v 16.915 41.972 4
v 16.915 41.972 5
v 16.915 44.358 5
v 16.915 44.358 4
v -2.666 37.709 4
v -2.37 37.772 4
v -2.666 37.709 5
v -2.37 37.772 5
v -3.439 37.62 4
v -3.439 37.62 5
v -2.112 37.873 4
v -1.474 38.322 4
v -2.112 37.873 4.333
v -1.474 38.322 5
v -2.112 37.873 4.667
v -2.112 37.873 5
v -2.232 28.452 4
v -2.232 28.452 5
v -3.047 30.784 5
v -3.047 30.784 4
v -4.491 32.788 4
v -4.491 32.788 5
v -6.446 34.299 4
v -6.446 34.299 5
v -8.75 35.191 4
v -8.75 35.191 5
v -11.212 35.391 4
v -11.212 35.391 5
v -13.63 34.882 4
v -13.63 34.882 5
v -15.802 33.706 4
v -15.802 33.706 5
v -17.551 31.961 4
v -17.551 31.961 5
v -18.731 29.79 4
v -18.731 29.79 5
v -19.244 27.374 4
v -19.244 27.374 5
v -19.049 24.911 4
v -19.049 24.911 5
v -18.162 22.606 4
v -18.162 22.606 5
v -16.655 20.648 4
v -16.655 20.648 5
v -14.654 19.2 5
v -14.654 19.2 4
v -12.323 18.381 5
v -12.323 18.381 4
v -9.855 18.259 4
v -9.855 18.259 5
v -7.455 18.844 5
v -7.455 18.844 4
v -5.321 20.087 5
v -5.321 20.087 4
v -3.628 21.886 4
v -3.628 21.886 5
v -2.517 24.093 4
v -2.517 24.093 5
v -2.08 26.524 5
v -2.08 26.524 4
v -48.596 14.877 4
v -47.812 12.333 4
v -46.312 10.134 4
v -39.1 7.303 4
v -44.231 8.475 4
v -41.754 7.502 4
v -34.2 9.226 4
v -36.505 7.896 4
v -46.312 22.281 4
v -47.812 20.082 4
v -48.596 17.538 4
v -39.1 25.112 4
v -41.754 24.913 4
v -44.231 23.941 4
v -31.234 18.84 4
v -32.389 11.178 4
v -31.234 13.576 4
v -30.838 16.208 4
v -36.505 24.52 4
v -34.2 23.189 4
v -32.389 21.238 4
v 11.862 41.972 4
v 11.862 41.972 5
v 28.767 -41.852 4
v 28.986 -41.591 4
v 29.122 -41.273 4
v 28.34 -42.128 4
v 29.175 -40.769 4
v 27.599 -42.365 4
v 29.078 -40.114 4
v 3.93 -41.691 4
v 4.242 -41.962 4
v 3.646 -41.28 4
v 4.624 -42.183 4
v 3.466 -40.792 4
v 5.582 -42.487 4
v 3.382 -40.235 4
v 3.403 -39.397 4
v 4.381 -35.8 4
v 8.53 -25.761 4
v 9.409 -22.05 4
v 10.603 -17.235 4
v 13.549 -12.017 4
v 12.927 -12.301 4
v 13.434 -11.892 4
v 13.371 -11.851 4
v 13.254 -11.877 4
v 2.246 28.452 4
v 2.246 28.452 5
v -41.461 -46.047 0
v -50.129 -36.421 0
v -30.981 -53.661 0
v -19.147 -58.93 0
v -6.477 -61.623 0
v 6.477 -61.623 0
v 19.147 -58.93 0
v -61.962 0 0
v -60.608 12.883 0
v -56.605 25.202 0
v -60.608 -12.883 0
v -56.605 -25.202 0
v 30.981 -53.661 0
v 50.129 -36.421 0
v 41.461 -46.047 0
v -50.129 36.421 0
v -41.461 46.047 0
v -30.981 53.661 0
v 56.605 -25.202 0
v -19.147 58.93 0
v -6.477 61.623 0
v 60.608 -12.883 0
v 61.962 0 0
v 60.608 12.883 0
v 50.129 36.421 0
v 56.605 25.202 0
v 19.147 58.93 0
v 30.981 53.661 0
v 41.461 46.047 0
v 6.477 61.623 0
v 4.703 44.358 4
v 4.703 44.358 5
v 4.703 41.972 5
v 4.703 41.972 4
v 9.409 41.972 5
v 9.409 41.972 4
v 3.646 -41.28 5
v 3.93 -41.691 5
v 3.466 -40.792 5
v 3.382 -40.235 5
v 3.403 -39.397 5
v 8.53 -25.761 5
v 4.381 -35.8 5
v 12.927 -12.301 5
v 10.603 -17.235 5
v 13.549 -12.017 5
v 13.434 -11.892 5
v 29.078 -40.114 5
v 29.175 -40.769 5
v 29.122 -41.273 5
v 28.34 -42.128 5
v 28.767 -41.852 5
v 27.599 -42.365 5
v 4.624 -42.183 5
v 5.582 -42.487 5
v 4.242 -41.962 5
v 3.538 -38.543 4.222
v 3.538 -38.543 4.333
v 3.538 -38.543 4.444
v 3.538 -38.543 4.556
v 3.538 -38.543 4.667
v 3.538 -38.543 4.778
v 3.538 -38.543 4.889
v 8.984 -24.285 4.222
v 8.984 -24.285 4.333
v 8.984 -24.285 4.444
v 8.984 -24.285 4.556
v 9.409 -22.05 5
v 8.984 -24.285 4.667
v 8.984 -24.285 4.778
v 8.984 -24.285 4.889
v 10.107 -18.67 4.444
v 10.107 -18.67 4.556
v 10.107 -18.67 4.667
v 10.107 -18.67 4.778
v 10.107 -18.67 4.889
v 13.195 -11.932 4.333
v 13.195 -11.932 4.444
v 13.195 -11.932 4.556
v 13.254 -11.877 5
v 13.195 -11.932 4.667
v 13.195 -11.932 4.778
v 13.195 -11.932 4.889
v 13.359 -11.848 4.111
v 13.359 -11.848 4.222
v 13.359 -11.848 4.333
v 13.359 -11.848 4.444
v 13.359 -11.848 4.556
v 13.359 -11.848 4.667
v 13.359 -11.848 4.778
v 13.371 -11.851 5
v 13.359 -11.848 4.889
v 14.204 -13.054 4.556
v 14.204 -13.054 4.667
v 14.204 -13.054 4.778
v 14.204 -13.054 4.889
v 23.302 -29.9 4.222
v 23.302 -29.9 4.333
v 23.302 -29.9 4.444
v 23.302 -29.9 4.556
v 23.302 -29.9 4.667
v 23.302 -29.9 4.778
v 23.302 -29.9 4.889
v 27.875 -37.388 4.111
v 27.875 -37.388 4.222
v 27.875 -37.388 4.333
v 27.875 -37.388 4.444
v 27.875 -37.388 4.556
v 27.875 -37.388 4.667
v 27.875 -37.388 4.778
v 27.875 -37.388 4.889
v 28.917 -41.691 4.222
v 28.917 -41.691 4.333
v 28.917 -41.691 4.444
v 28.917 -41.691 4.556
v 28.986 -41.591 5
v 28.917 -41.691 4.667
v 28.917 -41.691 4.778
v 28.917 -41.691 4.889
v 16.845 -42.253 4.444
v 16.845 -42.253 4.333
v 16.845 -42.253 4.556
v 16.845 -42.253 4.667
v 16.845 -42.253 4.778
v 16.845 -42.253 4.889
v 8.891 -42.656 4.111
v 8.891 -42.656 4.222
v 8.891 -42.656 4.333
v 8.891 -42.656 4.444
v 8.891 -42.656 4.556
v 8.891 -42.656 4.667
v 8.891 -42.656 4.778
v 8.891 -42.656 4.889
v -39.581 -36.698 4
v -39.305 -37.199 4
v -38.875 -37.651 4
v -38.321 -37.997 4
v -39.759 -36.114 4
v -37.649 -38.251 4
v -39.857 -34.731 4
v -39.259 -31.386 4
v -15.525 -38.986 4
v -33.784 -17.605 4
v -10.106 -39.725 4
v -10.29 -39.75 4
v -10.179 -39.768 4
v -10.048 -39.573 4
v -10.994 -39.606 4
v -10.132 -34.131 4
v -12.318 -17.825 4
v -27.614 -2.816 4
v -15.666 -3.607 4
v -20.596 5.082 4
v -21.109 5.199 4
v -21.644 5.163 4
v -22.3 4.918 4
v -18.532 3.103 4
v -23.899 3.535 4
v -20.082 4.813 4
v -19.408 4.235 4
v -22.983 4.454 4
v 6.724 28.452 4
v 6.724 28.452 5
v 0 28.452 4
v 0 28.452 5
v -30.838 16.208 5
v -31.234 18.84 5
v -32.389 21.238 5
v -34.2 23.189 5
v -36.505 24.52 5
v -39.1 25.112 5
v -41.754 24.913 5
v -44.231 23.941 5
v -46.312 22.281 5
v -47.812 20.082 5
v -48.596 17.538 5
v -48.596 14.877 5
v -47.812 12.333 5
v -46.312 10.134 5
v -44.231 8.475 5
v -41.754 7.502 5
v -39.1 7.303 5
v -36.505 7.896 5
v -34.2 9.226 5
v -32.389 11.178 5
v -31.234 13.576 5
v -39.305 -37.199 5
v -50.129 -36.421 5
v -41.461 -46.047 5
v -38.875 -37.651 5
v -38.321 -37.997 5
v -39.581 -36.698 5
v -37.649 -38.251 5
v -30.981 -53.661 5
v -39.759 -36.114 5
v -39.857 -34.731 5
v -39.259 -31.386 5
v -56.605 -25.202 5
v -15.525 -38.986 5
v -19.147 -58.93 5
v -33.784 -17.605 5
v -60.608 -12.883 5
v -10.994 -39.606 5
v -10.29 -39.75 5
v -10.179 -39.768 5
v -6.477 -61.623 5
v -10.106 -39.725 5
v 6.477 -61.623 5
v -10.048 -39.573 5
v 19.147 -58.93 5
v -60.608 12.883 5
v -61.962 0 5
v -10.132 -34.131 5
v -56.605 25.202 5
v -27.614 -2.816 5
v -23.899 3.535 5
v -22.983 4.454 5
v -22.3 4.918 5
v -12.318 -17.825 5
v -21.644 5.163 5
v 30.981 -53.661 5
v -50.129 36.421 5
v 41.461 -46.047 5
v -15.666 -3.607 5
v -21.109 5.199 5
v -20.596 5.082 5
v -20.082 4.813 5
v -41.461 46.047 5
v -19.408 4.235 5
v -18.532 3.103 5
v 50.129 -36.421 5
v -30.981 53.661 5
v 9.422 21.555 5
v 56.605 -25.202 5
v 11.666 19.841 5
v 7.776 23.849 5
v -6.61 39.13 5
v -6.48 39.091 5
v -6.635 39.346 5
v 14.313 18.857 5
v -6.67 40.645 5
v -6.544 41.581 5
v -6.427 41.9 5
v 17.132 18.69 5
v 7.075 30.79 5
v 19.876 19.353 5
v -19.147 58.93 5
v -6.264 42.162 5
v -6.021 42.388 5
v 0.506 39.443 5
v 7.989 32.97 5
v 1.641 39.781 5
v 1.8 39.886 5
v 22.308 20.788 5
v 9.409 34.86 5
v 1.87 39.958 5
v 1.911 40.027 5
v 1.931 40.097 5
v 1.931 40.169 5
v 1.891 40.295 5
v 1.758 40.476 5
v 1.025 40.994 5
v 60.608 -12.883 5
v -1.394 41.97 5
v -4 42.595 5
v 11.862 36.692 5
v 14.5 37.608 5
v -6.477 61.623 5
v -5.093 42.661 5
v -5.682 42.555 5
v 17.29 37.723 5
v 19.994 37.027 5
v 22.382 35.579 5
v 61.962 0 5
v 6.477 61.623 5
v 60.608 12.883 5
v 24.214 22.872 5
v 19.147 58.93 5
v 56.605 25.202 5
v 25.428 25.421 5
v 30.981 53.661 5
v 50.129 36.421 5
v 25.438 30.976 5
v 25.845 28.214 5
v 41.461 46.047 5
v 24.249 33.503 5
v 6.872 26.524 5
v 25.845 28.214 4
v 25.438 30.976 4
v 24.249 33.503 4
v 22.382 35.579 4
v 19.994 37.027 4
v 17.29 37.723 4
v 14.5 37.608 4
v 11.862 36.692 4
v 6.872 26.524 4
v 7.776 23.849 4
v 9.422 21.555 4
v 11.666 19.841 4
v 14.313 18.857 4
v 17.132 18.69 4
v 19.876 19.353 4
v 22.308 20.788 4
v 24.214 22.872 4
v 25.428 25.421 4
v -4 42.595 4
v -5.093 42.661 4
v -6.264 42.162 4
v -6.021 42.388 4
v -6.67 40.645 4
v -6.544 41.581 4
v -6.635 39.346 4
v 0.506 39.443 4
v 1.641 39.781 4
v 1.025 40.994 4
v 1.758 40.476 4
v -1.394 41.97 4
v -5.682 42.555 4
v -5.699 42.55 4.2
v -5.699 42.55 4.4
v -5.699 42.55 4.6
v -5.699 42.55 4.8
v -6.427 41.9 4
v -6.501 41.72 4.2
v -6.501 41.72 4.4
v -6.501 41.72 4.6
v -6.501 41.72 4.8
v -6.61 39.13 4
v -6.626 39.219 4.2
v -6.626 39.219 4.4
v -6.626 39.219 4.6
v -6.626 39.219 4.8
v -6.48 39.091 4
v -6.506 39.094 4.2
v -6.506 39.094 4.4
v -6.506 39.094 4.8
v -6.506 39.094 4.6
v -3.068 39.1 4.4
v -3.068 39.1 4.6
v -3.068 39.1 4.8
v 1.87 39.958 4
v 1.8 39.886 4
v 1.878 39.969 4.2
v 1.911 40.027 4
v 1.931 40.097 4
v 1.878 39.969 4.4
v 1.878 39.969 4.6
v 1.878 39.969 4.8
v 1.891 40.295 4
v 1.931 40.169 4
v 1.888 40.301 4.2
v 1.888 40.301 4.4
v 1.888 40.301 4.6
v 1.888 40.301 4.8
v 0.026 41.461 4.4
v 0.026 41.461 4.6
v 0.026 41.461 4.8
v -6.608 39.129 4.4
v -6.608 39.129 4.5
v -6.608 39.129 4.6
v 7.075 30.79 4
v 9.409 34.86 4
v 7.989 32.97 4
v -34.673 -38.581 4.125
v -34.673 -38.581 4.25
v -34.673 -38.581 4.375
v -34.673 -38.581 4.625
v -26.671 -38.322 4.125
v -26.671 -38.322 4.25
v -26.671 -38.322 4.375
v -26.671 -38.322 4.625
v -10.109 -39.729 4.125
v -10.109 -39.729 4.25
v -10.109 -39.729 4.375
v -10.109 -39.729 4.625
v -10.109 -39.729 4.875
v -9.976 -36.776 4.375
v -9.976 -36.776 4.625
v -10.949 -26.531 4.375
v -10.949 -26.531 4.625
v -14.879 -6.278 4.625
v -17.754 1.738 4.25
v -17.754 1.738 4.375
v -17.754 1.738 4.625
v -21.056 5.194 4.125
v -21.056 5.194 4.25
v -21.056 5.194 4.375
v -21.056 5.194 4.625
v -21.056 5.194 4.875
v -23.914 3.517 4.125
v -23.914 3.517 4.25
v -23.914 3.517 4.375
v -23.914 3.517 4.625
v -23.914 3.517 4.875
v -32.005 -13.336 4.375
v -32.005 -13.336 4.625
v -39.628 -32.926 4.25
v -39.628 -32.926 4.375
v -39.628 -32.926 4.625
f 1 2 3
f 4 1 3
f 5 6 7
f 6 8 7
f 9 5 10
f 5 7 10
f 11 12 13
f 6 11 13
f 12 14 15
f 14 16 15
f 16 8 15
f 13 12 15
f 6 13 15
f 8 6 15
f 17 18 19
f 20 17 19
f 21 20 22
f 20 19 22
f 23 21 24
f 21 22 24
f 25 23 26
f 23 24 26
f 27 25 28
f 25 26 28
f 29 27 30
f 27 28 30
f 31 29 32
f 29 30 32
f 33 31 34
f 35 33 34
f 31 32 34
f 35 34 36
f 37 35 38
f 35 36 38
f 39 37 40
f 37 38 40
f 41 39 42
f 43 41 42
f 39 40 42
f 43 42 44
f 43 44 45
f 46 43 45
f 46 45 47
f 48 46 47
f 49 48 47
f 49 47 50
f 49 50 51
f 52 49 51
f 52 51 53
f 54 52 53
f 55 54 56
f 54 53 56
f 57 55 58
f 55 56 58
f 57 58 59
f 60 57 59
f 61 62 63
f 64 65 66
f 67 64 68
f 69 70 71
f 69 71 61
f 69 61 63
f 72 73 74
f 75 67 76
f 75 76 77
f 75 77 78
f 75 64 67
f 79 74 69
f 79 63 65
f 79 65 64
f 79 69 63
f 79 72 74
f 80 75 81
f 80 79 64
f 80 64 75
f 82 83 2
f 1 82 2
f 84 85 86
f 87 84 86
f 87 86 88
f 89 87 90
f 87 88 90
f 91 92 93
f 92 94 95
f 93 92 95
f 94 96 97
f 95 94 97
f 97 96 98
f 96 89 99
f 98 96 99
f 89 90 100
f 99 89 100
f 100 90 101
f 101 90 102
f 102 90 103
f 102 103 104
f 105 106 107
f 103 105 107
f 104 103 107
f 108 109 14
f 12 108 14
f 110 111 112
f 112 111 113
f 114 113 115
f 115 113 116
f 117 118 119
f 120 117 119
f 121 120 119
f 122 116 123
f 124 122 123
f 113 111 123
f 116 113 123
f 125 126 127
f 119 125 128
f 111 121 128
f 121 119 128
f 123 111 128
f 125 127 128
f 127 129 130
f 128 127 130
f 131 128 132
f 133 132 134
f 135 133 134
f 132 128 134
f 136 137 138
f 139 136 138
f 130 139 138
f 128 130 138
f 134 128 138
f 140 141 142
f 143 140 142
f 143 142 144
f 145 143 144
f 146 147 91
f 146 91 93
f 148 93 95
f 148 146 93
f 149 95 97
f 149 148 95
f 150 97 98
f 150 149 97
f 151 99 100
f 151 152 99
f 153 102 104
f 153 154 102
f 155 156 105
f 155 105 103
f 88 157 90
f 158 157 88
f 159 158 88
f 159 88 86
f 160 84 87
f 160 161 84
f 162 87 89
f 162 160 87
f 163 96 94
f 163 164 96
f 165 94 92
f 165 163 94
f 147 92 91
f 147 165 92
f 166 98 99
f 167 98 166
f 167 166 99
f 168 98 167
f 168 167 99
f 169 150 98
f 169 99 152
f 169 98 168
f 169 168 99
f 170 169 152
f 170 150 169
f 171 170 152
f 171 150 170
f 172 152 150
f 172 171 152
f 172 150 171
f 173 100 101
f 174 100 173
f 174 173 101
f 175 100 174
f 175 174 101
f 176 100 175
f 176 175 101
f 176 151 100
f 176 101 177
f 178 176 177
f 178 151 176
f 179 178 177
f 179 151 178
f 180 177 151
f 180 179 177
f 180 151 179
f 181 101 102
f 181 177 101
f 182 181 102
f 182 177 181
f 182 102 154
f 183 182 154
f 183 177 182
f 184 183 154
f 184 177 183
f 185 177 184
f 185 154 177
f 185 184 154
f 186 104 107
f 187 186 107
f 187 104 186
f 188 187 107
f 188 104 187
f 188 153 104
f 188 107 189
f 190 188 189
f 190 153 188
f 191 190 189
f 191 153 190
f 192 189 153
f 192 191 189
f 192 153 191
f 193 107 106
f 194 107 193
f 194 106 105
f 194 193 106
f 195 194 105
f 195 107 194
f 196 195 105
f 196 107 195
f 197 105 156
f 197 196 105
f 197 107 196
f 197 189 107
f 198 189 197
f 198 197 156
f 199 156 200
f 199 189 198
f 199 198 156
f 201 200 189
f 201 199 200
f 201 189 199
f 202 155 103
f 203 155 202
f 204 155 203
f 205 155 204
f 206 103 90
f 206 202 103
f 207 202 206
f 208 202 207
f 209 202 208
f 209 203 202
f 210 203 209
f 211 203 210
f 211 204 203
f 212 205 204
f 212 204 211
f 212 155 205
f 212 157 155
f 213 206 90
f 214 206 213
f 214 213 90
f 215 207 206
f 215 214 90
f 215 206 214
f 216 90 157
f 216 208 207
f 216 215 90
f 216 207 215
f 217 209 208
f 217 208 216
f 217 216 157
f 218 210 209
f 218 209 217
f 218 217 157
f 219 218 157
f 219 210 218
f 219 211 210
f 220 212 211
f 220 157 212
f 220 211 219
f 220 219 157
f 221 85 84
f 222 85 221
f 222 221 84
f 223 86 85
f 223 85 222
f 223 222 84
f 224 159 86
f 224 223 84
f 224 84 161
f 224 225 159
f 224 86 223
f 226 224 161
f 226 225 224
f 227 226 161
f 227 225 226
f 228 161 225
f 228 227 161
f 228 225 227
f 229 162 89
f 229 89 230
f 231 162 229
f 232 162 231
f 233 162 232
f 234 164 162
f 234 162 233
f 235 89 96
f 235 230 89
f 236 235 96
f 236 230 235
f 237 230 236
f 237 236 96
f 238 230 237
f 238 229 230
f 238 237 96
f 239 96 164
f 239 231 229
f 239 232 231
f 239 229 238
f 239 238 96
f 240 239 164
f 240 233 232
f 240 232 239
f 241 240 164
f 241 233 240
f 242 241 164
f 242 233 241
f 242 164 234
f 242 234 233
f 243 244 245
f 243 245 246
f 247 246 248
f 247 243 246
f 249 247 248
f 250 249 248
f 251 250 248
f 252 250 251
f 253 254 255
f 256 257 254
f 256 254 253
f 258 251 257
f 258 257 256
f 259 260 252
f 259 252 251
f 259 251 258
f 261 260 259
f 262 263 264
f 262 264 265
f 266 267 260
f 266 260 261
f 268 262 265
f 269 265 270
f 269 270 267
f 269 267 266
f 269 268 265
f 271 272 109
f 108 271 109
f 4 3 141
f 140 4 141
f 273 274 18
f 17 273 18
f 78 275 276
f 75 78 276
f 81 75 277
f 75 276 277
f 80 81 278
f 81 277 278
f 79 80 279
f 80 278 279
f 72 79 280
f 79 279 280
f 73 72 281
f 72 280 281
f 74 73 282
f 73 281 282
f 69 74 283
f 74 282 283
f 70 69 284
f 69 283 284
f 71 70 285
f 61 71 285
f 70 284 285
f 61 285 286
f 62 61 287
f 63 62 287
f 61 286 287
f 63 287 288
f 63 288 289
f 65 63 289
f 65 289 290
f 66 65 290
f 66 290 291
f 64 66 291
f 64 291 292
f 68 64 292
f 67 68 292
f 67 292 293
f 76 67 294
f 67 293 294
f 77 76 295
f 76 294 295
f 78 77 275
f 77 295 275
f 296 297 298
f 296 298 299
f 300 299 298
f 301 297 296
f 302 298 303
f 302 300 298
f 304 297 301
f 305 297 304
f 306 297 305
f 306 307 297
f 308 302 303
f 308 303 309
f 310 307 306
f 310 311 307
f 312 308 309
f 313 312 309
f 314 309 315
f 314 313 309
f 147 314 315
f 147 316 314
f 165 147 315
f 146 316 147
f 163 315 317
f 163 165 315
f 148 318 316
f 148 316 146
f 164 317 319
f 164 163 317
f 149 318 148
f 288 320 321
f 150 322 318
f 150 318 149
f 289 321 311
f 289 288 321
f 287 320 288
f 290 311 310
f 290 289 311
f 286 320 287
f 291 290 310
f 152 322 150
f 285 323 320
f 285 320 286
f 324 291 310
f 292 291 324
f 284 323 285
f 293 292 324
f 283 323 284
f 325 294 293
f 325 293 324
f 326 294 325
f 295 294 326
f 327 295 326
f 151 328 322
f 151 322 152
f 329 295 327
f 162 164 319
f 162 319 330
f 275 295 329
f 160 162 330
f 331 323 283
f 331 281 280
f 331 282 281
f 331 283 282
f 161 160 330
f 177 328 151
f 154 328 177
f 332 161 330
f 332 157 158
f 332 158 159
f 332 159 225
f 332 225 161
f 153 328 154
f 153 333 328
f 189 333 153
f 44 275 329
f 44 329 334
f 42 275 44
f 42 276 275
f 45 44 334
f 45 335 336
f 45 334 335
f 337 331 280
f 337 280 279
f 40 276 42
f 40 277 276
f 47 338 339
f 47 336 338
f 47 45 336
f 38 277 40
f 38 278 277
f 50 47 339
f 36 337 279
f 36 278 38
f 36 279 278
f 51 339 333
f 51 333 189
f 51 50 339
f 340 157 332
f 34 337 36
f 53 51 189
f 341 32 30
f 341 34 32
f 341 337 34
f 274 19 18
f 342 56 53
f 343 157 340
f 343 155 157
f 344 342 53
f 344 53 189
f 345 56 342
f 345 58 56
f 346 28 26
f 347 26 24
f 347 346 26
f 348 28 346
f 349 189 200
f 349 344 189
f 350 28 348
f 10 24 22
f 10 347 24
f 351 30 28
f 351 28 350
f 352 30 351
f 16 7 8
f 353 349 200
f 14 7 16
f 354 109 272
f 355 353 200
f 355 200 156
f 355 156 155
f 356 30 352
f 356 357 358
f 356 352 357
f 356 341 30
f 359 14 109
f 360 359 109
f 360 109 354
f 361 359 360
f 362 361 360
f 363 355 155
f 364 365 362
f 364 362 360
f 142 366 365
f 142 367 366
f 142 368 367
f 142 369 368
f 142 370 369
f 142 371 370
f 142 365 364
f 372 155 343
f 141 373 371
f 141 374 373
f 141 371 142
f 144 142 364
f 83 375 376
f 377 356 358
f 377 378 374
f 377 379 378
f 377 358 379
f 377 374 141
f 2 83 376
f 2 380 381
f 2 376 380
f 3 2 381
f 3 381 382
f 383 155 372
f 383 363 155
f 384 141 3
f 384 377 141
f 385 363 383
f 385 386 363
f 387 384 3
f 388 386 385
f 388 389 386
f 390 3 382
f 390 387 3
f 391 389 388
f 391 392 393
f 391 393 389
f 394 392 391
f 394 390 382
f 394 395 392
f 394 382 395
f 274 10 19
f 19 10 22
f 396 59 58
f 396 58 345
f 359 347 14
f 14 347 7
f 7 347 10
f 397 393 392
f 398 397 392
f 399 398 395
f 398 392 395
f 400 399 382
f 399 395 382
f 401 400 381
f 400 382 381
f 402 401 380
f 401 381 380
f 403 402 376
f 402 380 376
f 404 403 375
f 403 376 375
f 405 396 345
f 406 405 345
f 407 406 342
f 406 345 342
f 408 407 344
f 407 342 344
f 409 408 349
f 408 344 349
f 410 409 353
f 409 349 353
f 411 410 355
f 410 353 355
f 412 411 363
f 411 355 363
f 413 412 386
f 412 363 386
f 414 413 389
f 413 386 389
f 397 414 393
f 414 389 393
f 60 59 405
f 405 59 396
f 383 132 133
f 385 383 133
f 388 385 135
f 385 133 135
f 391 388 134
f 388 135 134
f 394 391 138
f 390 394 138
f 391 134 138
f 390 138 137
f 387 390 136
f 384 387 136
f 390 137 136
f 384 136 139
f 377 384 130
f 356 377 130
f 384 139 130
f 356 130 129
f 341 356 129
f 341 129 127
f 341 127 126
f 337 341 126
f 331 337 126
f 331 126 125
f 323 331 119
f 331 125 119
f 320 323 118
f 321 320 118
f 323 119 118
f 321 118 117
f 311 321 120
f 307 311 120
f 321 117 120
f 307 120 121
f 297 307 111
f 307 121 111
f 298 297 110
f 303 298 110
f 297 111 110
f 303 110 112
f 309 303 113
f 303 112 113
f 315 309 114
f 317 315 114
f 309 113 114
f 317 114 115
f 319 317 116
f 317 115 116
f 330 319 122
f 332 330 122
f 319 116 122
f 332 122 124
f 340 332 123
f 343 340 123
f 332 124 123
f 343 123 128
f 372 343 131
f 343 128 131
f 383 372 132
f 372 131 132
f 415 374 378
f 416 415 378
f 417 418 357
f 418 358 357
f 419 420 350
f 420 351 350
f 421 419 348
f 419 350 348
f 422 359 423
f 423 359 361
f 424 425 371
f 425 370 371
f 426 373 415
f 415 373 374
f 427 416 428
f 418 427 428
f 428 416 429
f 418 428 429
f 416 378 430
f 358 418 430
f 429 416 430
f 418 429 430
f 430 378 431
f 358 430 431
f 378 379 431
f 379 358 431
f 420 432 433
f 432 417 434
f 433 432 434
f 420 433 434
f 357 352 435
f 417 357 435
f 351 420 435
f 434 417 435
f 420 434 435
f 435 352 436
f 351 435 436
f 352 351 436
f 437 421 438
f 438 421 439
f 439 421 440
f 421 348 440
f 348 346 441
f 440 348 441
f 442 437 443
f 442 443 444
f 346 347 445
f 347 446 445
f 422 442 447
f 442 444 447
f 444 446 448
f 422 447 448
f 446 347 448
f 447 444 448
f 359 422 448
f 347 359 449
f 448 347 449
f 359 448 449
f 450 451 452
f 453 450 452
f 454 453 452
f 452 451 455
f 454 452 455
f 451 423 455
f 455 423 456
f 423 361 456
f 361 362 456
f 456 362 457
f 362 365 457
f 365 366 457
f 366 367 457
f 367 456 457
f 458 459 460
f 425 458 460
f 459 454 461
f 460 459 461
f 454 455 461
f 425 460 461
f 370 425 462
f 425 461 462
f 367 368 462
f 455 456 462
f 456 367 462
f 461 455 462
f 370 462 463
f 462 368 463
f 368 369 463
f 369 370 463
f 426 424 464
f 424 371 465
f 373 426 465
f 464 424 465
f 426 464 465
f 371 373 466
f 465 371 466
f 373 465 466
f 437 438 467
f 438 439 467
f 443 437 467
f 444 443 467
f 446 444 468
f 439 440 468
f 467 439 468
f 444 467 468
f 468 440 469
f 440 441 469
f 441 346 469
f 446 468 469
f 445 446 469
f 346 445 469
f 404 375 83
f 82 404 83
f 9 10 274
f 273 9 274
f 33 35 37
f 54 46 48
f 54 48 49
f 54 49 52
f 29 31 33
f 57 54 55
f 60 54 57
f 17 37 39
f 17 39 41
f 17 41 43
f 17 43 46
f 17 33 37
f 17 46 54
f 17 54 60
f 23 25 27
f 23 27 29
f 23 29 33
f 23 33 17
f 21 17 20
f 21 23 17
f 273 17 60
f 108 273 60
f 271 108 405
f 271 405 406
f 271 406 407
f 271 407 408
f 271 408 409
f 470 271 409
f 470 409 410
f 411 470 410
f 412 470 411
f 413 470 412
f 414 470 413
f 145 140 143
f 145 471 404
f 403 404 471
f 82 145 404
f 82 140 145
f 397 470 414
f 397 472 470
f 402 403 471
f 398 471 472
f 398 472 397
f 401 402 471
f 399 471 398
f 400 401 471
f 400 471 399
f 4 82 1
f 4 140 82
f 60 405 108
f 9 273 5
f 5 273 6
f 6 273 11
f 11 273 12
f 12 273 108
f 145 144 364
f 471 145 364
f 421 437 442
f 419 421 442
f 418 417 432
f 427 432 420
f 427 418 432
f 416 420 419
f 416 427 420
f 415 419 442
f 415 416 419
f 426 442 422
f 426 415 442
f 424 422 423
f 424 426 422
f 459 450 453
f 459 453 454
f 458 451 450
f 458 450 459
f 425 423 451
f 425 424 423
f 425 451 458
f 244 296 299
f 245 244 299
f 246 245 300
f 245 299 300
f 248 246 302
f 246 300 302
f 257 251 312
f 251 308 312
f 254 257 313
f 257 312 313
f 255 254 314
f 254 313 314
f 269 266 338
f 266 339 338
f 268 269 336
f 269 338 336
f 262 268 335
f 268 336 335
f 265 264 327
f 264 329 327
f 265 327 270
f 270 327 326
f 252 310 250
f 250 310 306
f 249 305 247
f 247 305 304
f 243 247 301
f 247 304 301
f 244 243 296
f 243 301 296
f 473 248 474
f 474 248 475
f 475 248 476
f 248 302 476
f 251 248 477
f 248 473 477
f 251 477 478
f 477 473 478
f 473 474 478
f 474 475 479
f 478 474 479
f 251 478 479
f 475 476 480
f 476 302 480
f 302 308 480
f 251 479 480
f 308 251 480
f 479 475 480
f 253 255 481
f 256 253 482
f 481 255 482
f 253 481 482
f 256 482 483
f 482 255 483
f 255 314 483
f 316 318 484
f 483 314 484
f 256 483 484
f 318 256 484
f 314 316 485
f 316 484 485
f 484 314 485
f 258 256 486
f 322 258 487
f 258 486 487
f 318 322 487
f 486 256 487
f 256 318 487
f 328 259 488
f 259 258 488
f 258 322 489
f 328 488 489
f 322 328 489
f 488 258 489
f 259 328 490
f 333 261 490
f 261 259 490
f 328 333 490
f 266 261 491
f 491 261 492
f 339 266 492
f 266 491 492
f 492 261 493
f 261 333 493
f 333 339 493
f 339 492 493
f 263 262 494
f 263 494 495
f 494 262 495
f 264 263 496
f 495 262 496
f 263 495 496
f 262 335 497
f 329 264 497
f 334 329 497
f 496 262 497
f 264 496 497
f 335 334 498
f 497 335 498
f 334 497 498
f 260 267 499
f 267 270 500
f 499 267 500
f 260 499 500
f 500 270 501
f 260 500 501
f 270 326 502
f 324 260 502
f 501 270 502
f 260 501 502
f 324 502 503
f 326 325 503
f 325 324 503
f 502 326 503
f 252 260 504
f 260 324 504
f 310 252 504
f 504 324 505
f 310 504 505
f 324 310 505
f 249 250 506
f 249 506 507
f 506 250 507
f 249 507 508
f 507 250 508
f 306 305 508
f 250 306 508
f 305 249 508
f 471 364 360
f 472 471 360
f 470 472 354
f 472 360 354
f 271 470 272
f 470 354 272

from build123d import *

# Parameters (mm, degrees)
F0_R     = 61.9623487285
F1_DEPTH = 5
F3_DEPTH = 1
F5_DEPTH = 1
F7_DEPTH = 1
F8_R     = 8.9292690279
F9_DEPTH = 1


with BuildPart() as f1:
    # F0 (on Top) → F1 (new body)
    with BuildSketch(Plane.XY):
        Circle(F0_R)
    extrude(amount=F1_DEPTH)

    # F2 (on face) → F3 (cut)
    with BuildSketch(Plane.XY.offset(5)):
        with BuildLine():
            add(Edge.make_bspline(
                [(-39.3048152328, -37.1991991997), (-37.7651793317, -39.3408560727), (-26.9602400655, -37.2654556836), (-10.6570598611, -39.5580218969), (-9.7558151733, -39.9834038407), (-10.152733857, -26.2704585367), (-19.5242322502, 19.941913429), (-32.5509442958, -15.6080702025), (-37.5478248801, -25.608945775), (-40.6668393278, -35.3046030406), (-39.3048152328, -37.1991991997)],
                knots=[0, 0, 0, 0, 0.1218310574, 0.2601288227, 0.2782546382, 0.4026452671, 0.600038467, 0.758741847, 0.8922233266, 1, 1, 1, 1], degree=3))
        make_face()
        with BuildLine():
            add(Edge.make_bspline(
                [(3.9304825477, -41.6911803186), (2.6669968583, -40.319533603), (5.0751476068, -33.5221923515), (9.5794311322, -24.2966191015), (9.3447152511, -19.2791505142), (12.9838675707, -11.8248757534), (13.8949803592, -11.8008514316), (22.5604208824, -30.2915392719), (33.3890041695, -44.2826186469), (16.6647932689, -41.1593642165), (5.5715073066, -43.4726854353), (3.9304825477, -41.6911803186)],
                knots=[0, 0, 0, 0, 0.1029925867, 0.2240288031, 0.3130595643, 0.4143515368, 0.4340651574, 0.6024353208, 0.7368916239, 0.8662324503, 1, 1, 1, 1], degree=3))
        make_face()
    extrude(amount=-F3_DEPTH, mode=Mode.SUBTRACT)

    # F4 (on face) → F5 (cut)
    with BuildSketch(Plane.XY.offset(5)):
        with BuildLine():
            ThreePointArc((-2.0797521838, 26.5244096723), (-2.0760909326, 26.6692016953), (-2.0748703999, 26.8140348579))
            ThreePointArc((-2.0748703999, 26.8140348579), (-2.1143389598, 27.636722854), (-2.2323821086, 28.451854206))
            ThreePointArc((-2.2323821086, 28.451854206), (-19.2357400979, 26.1356316973), (-2.0797521838, 26.5244096723))
        make_face()
        with BuildLine():
            Line((-3.4391672816, 37.6203209162), (0, 28.451854206))
            Line((0, 28.451854206), (2.246047079, 28.451854206))
            Line((2.246047079, 28.451854206), (-1.4739270555, 38.3221954107))
            add(Edge.make_bspline(
                [(-1.4739270555, 38.3221954107), (-2.2559350586, 37.6613035057), (-2.4543322401, 37.7411414291), (-3.4391672816, 37.6203209162)],
                knots=[0.8438158989, 0.8438158989, 0.8438158989, 0.8438158989, 1, 1, 1, 1], degree=3))
        make_face()
        with BuildLine():
            ThreePointArc((-2.2323821086, 28.451854206), (-2.1143389598, 27.636722854), (-2.0748703999, 26.8140348579))
            ThreePointArc((-2.0748703999, 26.8140348579), (-2.0760909326, 26.6692016953), (-2.0797521838, 26.5244096723))
            Line((-2.0797521838, 26.5244096723), (6.8719364839, 26.5244096723))
            ThreePointArc((6.8719364839, 26.5244096723), (6.7493739769, 27.4843959893), (6.7244762665, 28.451854206))
            Line((6.7244762665, 28.451854206), (2.246047079, 28.451854206))
            Line((2.246047079, 28.451854206), (0, 28.451854206))
            Line((0, 28.451854206), (-2.2323821086, 28.451854206))
        make_face()
        with BuildLine():
            ThreePointArc((6.7244762665, 28.451854206), (6.7493739769, 27.4843959893), (6.8719364839, 26.5244096723))
            ThreePointArc((6.8719364839, 26.5244096723), (17.1315070497, 18.6895333875), (25.8454203948, 28.2138070504))
            ThreePointArc((25.8454203948, 28.2138070504), (21.2407645456, 36.3903685526), (11.8616344407, 36.6919178299))
            ThreePointArc((11.8616344407, 36.6919178299), (10.5615812468, 35.8748115663), (9.4090827366, 34.8601450514))
            ThreePointArc((9.4090827366, 34.8601450514), (7.4641415218, 31.9084609883), (6.7244762665, 28.451854206))
        make_face()
        with BuildLine():
            Line((9.4090827366, 41.9719282496), (9.4090827366, 34.8601450514))
            ThreePointArc((9.4090827366, 34.8601450514), (10.5615812468, 35.8748115663), (11.8616344407, 36.6919178299))
            Line((11.8616344407, 36.6919178299), (11.8616344407, 41.9719282496))
            Line((11.8616344407, 41.9719282496), (9.4090827366, 41.9719282496))
        make_face()
        Polygon((4.7025452368, 41.9719282496), (9.4090827366, 41.9719282496), (11.8616344407, 41.9719282496), (16.9151108712, 41.9719282496), (16.9151108712, 44.3582907319), (4.7025452368, 44.3582907319), align=None)
    extrude(amount=-F5_DEPTH, mode=Mode.SUBTRACT)

    # F6 (on face) → F7 (cut)
    with BuildSketch(Plane.XY.offset(5)):
        with BuildLine():
            add(Edge.make_bspline(
                [(-3.9998693392, 42.5951331854), (-5.4840353013, 42.8094104058), (-6.9211765833, 42.301449495), (-6.6092198889, 39.1996054356), (-6.6457444296, 38.9778993961), (7.2077359478, 39.0874898007), (-1.686567761, 42.261149086), (-3.9998693392, 42.5951331854)],
                knots=[0, 0, 0, 0, 0.1794642893, 0.3539269519, 0.4002900929, 0.7202772235, 1, 1, 1, 1], degree=3))
        make_face()
    extrude(amount=-F7_DEPTH, mode=Mode.SUBTRACT)

    # F8 (on face) → F9 (cut)
    with BuildSketch(Plane.XY.offset(5)):
        with Locations((-39.7668331861, 16.2076167762)):
            Circle(F8_R)
    extrude(amount=-F9_DEPTH, mode=Mode.SUBTRACT)


solid = f1.part
